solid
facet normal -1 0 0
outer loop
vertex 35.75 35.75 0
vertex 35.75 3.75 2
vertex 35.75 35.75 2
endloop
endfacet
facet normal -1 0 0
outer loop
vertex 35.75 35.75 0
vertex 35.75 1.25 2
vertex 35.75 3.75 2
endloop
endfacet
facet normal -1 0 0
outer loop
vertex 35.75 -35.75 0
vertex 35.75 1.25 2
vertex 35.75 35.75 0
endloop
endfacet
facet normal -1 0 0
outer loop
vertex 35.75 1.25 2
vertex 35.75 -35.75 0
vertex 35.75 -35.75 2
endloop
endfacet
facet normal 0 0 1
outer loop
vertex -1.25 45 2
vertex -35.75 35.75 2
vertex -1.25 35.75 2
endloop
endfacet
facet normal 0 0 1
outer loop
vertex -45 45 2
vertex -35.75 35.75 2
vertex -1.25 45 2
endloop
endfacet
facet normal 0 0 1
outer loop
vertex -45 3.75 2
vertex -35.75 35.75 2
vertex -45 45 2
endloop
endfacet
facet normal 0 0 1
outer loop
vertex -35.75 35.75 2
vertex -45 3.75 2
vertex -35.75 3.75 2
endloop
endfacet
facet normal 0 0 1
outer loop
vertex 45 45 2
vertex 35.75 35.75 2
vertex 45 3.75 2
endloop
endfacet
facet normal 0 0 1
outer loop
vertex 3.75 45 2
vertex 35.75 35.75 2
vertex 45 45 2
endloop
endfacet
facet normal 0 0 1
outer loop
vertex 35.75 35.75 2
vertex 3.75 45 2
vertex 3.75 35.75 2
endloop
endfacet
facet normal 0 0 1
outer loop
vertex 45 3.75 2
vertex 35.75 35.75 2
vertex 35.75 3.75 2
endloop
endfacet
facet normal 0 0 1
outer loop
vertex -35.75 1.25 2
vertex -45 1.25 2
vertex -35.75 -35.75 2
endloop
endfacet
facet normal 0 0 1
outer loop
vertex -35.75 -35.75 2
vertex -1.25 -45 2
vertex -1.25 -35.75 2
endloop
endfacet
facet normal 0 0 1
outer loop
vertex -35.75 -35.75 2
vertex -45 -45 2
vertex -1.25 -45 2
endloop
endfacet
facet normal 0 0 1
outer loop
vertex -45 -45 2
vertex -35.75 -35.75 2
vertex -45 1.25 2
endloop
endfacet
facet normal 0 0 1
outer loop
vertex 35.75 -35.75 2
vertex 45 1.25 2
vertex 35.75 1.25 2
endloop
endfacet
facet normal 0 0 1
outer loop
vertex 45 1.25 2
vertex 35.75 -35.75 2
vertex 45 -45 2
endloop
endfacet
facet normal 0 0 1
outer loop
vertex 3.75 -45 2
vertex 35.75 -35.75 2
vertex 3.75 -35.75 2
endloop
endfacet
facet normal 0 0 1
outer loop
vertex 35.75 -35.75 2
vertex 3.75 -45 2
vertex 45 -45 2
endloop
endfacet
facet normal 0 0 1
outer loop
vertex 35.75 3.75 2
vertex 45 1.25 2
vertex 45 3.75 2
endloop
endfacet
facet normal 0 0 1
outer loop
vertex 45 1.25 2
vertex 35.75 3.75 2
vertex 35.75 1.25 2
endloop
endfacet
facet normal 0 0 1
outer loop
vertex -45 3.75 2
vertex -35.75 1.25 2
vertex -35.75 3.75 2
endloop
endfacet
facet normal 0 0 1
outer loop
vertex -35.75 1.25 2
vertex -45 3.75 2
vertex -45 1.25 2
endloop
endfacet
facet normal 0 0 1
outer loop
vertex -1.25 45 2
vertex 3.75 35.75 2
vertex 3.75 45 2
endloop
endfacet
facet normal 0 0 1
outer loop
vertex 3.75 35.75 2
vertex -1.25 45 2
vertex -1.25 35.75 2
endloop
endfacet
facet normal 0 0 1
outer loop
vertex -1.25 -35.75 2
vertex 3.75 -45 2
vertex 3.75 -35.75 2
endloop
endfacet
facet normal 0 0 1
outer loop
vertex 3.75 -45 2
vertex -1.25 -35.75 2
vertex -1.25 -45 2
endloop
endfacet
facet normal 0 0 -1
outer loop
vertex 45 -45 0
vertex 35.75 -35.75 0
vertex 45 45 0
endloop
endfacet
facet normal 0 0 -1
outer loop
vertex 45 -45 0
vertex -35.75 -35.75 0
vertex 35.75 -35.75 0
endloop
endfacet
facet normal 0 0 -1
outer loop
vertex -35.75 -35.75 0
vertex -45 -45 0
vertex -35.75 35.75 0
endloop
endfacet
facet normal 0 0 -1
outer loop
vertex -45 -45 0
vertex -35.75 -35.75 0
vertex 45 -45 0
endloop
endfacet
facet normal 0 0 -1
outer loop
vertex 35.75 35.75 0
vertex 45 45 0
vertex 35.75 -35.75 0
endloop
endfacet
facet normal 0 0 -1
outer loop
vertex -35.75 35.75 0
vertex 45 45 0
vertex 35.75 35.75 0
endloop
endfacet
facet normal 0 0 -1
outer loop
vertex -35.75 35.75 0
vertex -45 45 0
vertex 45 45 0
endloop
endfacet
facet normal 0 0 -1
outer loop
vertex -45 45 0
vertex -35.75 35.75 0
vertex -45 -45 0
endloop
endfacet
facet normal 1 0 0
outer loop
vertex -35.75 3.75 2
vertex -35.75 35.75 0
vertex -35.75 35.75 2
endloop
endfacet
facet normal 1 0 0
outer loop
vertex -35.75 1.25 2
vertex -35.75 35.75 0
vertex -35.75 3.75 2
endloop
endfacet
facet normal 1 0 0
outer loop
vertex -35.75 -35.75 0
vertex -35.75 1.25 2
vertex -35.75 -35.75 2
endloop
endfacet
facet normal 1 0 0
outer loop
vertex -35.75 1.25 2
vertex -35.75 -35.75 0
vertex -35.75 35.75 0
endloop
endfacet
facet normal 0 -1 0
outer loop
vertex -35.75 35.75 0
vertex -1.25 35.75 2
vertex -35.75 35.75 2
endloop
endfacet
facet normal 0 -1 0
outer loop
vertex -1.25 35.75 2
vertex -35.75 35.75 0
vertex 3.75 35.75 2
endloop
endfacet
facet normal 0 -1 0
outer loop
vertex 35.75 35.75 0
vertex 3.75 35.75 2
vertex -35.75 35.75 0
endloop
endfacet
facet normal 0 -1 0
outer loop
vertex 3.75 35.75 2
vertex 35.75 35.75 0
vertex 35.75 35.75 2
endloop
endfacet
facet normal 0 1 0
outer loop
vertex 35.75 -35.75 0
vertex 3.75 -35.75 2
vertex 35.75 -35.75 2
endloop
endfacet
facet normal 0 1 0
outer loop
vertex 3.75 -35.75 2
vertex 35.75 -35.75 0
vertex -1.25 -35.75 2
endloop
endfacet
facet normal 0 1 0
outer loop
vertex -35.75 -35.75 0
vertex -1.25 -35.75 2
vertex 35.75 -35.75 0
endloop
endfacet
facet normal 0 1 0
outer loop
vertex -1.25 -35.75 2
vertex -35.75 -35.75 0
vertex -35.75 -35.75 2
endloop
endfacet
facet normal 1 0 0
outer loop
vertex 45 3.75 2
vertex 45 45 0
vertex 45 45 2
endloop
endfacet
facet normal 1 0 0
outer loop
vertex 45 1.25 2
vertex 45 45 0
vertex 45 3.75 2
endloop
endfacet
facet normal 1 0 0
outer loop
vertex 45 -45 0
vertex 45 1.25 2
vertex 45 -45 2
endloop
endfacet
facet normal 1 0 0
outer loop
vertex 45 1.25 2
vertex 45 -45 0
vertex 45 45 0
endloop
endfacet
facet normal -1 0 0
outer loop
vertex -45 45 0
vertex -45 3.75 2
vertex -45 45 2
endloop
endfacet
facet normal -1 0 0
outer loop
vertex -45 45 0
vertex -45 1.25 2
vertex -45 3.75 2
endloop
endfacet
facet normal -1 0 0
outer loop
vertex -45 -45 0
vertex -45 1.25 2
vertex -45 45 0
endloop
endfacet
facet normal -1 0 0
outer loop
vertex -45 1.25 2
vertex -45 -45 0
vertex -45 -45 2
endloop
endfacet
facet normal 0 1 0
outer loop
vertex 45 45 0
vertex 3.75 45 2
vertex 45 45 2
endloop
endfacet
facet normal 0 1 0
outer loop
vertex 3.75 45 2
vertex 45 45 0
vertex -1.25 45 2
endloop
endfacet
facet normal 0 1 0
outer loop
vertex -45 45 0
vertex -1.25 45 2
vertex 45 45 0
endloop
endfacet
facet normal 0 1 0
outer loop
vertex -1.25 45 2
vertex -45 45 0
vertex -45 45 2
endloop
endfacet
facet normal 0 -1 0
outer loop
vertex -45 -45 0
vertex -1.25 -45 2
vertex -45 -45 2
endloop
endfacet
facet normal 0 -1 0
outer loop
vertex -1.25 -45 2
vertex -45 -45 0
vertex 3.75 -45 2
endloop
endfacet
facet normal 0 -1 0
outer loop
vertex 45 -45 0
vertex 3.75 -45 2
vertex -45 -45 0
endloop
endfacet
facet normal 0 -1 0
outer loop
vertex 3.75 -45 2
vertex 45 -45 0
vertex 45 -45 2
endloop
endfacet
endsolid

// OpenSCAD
// Built by bench/smallmodels/features/compiler.py from a list of features.
$fn = 64;
difference() {
  union() {
    translate([0, 0, 0]) translate([-45, -45, 0]) cube([90, 90, 2]);
  }
  union() {
    translate([0, 0, 0]) rotate([0, 0, 0]) translate([-35.75, -35.75, 0]) cube([71.5, 71.5, 2]);
    translate([0, -177.5, 2]) rotate([0, 0, 0]) translate([-45, -1.25, 0]) cube([90, 2.5, 38]);
    translate([0, -87.5, 2]) rotate([0, 0, 0]) translate([-45, -1.25, 0]) cube([90, 2.5, 38]);
    translate([0, 2.5, 2]) rotate([0, 0, 0]) translate([-45, -1.25, 0]) cube([90, 2.5, 38]);
    translate([0, 92.5, 2]) rotate([0, 0, 0]) translate([-45, -1.25, 0]) cube([90, 2.5, 38]);
    translate([-177.5, 0, 2]) rotate([0, 0, 0]) translate([-1.25, -45, 0]) cube([2.5, 90, 38]);
    translate([-87.5, 0, 2]) rotate([0, 0, 0]) translate([-1.25, -45, 0]) cube([2.5, 90, 38]);
    translate([2.5, 0, 2]) rotate([0, 0, 0]) translate([-1.25, -45, 0]) cube([2.5, 90, 38]);
    translate([92.5, 0, 2]) rotate([0, 0, 0]) translate([-1.25, -45, 0]) cube([2.5, 90, 38]);
    translate([0, -177.5, 2]) rotate([0, 0, 0]) translate([-1.25, -45, 0]) cube([2.5, 90, 38]);
    translate([0, -87.5, 2]) rotate([0, 0, 0]) translate([-1.25, -45, 0]) cube([2.5, 90, 38]);
    translate([0, 2.5, 2]) rotate([0, 0, 0]) translate([-1.25, -45, 0]) cube([2.5, 90, 38]);
    translate([0, 92.5, 2]) rotate([0, 0, 0]) translate([-1.25, -45, 0]) cube([2.5, 90, 38]);
    translate([0, -92.5, 2]) rotate([0, 0, 0]) translate([-1.25, -45, 0]) cube([2.5, 90, 38]);
    translate([0, -2.5, 2]) rotate([0, 0, 0]) translate([-1.25, -45, 0]) cube([2.5, 90, 38]);
    translate([0, 87.5, 2]) rotate([0, 0, 0]) translate([-1.25, -45, 0]) cube([2.5, 90, 38]);
    translate([0, 177.5, 2]) rotate([0, 0, 0]) translate([-1.25, -45, 0]) cube([2.5, 90, 38]);
  }
}
